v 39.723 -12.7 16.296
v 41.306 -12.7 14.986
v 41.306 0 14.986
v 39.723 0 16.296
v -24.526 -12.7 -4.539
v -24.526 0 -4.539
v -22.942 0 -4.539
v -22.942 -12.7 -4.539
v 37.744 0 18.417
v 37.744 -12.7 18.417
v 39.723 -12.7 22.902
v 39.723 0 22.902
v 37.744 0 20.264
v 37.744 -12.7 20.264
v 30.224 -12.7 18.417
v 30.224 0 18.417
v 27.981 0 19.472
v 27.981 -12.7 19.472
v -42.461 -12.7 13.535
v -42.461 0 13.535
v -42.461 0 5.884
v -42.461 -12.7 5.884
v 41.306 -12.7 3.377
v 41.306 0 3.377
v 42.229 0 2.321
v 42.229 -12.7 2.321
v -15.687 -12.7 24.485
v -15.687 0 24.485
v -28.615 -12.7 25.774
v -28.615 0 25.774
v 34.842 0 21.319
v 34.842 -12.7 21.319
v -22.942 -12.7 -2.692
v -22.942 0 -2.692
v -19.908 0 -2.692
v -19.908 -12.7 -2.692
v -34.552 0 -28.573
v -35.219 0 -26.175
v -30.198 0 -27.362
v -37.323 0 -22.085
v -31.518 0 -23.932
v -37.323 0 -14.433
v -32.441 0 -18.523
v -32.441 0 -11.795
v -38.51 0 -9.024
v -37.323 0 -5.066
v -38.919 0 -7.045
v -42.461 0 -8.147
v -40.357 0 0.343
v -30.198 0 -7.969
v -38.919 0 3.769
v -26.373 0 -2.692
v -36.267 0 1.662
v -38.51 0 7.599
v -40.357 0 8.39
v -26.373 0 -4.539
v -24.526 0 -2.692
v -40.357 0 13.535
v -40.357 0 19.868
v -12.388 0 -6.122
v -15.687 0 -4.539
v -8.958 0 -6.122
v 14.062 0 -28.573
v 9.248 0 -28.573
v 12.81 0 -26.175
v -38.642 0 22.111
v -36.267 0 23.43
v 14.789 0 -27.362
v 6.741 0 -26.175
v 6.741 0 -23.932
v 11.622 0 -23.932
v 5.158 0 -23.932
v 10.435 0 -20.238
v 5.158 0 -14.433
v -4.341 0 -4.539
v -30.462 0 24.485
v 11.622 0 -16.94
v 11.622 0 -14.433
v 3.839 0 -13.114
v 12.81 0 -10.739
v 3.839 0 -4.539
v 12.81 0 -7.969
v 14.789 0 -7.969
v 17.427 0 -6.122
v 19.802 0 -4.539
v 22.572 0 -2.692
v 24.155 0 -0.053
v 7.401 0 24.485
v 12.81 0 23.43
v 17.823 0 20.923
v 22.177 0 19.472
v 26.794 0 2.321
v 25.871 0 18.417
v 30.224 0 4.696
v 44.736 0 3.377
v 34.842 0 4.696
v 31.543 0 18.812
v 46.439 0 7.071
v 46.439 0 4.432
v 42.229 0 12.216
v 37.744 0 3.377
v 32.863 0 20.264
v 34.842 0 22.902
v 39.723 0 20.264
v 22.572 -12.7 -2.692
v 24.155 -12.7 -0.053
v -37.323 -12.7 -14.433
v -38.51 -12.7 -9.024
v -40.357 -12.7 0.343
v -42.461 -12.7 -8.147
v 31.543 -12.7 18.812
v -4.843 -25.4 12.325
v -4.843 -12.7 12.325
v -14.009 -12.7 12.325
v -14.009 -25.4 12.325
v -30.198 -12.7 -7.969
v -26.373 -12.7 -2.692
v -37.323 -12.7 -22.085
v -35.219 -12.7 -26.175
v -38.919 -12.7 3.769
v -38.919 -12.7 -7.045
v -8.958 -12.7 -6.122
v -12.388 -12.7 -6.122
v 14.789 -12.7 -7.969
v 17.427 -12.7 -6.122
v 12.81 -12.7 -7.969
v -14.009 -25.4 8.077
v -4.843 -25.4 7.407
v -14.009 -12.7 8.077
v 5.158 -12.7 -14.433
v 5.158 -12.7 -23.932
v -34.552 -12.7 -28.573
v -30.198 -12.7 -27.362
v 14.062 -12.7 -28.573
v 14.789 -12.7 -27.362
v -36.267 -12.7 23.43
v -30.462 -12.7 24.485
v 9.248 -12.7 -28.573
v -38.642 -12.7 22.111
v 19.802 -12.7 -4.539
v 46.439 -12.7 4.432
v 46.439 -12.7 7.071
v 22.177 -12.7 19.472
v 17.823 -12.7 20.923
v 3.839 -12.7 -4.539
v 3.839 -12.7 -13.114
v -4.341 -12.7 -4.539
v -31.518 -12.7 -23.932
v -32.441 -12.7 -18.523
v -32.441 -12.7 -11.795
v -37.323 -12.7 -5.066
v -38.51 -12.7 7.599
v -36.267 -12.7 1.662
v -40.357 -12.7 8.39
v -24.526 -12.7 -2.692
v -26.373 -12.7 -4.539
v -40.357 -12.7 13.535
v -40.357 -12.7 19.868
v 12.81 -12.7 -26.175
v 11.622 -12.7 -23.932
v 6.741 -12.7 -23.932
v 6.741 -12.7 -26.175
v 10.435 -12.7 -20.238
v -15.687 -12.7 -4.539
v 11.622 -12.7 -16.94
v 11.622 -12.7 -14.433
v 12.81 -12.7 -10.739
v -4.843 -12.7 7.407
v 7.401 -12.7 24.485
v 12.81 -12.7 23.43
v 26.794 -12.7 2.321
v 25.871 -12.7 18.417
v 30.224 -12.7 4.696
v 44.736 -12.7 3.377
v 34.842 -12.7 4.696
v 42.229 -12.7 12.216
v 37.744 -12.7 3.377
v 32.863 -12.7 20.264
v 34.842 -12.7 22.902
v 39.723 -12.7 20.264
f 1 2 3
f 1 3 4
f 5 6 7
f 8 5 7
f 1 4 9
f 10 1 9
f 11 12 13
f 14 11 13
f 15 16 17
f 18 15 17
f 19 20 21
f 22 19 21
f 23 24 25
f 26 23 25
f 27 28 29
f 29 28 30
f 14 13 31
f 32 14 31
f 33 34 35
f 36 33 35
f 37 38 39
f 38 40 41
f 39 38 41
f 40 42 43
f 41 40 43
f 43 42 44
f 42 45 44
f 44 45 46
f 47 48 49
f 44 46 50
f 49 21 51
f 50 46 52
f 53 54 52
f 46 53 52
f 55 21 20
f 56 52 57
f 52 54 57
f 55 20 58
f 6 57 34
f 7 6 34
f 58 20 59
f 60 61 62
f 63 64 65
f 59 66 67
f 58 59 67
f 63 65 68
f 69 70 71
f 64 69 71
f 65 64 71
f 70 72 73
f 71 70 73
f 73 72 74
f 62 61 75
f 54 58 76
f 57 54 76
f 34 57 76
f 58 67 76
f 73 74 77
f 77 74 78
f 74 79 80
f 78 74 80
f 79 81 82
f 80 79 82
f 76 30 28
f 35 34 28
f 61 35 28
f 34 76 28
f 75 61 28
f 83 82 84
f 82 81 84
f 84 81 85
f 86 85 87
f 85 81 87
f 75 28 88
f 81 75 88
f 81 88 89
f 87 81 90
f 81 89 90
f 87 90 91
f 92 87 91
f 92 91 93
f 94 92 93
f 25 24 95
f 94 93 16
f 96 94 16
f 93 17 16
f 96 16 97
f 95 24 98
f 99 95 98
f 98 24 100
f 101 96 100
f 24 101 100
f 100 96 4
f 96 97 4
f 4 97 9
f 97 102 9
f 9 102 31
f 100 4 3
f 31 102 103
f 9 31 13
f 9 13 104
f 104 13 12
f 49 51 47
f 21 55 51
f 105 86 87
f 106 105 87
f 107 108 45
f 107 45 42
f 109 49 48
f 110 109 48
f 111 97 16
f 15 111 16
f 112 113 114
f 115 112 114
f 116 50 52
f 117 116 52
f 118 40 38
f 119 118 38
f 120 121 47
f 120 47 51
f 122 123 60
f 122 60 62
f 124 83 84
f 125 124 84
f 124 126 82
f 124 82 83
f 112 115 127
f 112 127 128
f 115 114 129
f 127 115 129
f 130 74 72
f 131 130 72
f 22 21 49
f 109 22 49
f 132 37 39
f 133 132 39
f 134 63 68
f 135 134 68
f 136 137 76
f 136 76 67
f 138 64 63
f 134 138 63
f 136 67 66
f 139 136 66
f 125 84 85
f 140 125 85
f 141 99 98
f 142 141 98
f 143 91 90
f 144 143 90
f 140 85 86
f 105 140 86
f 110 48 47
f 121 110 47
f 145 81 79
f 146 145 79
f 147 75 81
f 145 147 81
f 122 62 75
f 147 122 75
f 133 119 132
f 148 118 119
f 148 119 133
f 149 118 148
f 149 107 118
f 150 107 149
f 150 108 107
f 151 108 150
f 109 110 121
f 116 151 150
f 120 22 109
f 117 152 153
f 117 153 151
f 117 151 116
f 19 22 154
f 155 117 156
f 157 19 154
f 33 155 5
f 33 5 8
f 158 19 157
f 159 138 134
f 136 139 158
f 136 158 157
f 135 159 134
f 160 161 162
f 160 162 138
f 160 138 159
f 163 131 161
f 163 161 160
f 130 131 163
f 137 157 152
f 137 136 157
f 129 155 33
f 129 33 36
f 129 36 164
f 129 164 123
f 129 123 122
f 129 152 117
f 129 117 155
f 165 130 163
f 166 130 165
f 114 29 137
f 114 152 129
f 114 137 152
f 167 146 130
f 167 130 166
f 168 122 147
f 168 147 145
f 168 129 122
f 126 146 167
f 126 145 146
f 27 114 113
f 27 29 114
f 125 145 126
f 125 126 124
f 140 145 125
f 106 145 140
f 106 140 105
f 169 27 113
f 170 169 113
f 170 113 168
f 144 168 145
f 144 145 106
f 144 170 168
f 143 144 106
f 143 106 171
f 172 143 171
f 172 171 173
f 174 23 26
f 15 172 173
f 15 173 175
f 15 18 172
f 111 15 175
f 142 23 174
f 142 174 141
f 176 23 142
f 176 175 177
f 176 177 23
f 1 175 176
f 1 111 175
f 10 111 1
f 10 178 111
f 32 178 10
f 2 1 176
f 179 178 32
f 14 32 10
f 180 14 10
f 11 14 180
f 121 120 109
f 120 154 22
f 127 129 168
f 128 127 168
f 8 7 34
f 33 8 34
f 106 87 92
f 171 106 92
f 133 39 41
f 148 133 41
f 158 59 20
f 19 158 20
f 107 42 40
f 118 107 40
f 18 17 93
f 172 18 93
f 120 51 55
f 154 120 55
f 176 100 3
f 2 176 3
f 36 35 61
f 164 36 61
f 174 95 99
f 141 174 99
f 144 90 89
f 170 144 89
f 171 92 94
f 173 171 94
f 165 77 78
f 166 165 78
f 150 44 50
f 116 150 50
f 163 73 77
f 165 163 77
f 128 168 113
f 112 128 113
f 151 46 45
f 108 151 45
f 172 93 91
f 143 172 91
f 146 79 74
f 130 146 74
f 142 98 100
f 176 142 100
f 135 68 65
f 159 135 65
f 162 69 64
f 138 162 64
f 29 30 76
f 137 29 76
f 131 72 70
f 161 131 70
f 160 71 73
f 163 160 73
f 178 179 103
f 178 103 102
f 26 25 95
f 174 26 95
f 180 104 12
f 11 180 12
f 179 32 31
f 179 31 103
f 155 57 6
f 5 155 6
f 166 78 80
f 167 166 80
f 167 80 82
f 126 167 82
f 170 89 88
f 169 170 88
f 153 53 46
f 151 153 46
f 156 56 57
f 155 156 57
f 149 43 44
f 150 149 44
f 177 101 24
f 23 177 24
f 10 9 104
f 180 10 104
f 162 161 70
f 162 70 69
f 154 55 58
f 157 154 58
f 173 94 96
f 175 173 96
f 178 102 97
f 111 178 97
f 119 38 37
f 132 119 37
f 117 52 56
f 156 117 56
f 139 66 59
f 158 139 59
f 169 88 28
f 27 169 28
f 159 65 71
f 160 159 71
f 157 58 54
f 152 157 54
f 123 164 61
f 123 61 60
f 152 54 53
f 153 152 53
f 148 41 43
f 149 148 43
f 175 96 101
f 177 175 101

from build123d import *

# Parameters (mm, degrees)
F1_DEPTH = 12.7
F3_DEPTH = 12.7


with BuildPart() as f1:
    # F0 (on Front) → F1 (new body)
    with BuildSketch(Plane.XZ):
        Polygon((-28.615356, 25.77387), (-30.462335, 24.485242), (-36.267126, 23.429823), (-38.641814, 22.110556), (-40.356866, 19.867797), (-42.461474, 13.535295), (-42.461474, 5.883527), (-40.356866, 0.342589), (-42.461474, -8.147422), (-38.919031, -7.045326), (-38.919031, -0.844754), (-38.919031, 3.768534), (-40.356866, 8.39014), (-40.356866, 13.535295), (-38.509885, 7.598579), (-36.267126, 1.66186), (-37.322543, -5.06642), (-38.509885, -9.024232), (-37.322543, -14.433242), (-37.322543, -22.085012), (-35.219288, -26.17475), (-34.552074, -28.573201), (-30.19848, -27.362095), (-31.517752, -23.931991), (-32.441241, -18.522981), (-32.441241, -11.794701), (-30.19848, -7.968816), (-26.372596, -2.691734), (-26.372596, -4.538711), (-24.525617, -2.691734), (-24.525617, -4.538711), (-22.942492, -4.538711), (-22.942492, -2.691734), (-19.90817, -2.691734), (-15.686504, -4.538711), (-12.388325, -6.121836), (-8.958223, -6.121836), (-4.340774, -4.538711), (0.012816, -4.538711), (3.838704, -4.538711), (3.838704, -7.968816), (3.838704, -13.113971), (5.157971, -14.433242), (5.157971, -18.522981), (5.157971, -23.931991), (6.741096, -23.931991), (6.741096, -26.17475), (9.24771, -28.573201), (14.061987, -28.573201), (14.788651, -27.362095), (12.809743, -26.17475), (11.6224, -23.931991), (10.435057, -20.238034), (11.6224, -16.939856), (11.6224, -14.433242), (12.809743, -10.739285), (12.809743, -7.968816), (14.788651, -7.968816), (17.427192, -6.121836), (19.801878, -4.538711), (22.572347, -2.691734), (24.155469, -0.053193), (26.79401, 2.321497), (30.224116, 4.696183), (32.862657, 4.696183), (34.841561, 4.696183), (37.743957, 3.376913), (41.30599, 3.376913), (42.229482, 2.321497), (44.736096, 3.376913), (46.438526, 4.432328), (46.438526, 7.07087), (42.229482, 12.216028), (41.30599, 14.986497), (39.722868, 16.296333), (37.743957, 18.416595), (39.722868, 20.263579), (39.722868, 22.90212), (37.743957, 20.263579), (34.841561, 21.318991), (34.841561, 22.90212), (32.862657, 20.263579), (31.543382, 18.812377), (30.224116, 18.416595), (27.981357, 19.472015), (25.870525, 18.416595), (22.176565, 19.472015), (17.822974, 20.923209), (12.809743, 23.429823), (7.400733, 24.485242), (0.144743, 24.485242), (-8.298586, 24.485242), (-15.686504, 24.485242), align=None)
    extrude(amount=F1_DEPTH)

    # F2 (on face) → F3 (join)
    with BuildSketch(Plane.XZ.offset(12.7)):
        Polygon((-14.009252, 12.325057), (-14.009252, 8.07736), (-4.843168, 7.406671), (-4.843168, 12.325057), align=None)
    extrude(amount=F3_DEPTH)


solid = f1.part
